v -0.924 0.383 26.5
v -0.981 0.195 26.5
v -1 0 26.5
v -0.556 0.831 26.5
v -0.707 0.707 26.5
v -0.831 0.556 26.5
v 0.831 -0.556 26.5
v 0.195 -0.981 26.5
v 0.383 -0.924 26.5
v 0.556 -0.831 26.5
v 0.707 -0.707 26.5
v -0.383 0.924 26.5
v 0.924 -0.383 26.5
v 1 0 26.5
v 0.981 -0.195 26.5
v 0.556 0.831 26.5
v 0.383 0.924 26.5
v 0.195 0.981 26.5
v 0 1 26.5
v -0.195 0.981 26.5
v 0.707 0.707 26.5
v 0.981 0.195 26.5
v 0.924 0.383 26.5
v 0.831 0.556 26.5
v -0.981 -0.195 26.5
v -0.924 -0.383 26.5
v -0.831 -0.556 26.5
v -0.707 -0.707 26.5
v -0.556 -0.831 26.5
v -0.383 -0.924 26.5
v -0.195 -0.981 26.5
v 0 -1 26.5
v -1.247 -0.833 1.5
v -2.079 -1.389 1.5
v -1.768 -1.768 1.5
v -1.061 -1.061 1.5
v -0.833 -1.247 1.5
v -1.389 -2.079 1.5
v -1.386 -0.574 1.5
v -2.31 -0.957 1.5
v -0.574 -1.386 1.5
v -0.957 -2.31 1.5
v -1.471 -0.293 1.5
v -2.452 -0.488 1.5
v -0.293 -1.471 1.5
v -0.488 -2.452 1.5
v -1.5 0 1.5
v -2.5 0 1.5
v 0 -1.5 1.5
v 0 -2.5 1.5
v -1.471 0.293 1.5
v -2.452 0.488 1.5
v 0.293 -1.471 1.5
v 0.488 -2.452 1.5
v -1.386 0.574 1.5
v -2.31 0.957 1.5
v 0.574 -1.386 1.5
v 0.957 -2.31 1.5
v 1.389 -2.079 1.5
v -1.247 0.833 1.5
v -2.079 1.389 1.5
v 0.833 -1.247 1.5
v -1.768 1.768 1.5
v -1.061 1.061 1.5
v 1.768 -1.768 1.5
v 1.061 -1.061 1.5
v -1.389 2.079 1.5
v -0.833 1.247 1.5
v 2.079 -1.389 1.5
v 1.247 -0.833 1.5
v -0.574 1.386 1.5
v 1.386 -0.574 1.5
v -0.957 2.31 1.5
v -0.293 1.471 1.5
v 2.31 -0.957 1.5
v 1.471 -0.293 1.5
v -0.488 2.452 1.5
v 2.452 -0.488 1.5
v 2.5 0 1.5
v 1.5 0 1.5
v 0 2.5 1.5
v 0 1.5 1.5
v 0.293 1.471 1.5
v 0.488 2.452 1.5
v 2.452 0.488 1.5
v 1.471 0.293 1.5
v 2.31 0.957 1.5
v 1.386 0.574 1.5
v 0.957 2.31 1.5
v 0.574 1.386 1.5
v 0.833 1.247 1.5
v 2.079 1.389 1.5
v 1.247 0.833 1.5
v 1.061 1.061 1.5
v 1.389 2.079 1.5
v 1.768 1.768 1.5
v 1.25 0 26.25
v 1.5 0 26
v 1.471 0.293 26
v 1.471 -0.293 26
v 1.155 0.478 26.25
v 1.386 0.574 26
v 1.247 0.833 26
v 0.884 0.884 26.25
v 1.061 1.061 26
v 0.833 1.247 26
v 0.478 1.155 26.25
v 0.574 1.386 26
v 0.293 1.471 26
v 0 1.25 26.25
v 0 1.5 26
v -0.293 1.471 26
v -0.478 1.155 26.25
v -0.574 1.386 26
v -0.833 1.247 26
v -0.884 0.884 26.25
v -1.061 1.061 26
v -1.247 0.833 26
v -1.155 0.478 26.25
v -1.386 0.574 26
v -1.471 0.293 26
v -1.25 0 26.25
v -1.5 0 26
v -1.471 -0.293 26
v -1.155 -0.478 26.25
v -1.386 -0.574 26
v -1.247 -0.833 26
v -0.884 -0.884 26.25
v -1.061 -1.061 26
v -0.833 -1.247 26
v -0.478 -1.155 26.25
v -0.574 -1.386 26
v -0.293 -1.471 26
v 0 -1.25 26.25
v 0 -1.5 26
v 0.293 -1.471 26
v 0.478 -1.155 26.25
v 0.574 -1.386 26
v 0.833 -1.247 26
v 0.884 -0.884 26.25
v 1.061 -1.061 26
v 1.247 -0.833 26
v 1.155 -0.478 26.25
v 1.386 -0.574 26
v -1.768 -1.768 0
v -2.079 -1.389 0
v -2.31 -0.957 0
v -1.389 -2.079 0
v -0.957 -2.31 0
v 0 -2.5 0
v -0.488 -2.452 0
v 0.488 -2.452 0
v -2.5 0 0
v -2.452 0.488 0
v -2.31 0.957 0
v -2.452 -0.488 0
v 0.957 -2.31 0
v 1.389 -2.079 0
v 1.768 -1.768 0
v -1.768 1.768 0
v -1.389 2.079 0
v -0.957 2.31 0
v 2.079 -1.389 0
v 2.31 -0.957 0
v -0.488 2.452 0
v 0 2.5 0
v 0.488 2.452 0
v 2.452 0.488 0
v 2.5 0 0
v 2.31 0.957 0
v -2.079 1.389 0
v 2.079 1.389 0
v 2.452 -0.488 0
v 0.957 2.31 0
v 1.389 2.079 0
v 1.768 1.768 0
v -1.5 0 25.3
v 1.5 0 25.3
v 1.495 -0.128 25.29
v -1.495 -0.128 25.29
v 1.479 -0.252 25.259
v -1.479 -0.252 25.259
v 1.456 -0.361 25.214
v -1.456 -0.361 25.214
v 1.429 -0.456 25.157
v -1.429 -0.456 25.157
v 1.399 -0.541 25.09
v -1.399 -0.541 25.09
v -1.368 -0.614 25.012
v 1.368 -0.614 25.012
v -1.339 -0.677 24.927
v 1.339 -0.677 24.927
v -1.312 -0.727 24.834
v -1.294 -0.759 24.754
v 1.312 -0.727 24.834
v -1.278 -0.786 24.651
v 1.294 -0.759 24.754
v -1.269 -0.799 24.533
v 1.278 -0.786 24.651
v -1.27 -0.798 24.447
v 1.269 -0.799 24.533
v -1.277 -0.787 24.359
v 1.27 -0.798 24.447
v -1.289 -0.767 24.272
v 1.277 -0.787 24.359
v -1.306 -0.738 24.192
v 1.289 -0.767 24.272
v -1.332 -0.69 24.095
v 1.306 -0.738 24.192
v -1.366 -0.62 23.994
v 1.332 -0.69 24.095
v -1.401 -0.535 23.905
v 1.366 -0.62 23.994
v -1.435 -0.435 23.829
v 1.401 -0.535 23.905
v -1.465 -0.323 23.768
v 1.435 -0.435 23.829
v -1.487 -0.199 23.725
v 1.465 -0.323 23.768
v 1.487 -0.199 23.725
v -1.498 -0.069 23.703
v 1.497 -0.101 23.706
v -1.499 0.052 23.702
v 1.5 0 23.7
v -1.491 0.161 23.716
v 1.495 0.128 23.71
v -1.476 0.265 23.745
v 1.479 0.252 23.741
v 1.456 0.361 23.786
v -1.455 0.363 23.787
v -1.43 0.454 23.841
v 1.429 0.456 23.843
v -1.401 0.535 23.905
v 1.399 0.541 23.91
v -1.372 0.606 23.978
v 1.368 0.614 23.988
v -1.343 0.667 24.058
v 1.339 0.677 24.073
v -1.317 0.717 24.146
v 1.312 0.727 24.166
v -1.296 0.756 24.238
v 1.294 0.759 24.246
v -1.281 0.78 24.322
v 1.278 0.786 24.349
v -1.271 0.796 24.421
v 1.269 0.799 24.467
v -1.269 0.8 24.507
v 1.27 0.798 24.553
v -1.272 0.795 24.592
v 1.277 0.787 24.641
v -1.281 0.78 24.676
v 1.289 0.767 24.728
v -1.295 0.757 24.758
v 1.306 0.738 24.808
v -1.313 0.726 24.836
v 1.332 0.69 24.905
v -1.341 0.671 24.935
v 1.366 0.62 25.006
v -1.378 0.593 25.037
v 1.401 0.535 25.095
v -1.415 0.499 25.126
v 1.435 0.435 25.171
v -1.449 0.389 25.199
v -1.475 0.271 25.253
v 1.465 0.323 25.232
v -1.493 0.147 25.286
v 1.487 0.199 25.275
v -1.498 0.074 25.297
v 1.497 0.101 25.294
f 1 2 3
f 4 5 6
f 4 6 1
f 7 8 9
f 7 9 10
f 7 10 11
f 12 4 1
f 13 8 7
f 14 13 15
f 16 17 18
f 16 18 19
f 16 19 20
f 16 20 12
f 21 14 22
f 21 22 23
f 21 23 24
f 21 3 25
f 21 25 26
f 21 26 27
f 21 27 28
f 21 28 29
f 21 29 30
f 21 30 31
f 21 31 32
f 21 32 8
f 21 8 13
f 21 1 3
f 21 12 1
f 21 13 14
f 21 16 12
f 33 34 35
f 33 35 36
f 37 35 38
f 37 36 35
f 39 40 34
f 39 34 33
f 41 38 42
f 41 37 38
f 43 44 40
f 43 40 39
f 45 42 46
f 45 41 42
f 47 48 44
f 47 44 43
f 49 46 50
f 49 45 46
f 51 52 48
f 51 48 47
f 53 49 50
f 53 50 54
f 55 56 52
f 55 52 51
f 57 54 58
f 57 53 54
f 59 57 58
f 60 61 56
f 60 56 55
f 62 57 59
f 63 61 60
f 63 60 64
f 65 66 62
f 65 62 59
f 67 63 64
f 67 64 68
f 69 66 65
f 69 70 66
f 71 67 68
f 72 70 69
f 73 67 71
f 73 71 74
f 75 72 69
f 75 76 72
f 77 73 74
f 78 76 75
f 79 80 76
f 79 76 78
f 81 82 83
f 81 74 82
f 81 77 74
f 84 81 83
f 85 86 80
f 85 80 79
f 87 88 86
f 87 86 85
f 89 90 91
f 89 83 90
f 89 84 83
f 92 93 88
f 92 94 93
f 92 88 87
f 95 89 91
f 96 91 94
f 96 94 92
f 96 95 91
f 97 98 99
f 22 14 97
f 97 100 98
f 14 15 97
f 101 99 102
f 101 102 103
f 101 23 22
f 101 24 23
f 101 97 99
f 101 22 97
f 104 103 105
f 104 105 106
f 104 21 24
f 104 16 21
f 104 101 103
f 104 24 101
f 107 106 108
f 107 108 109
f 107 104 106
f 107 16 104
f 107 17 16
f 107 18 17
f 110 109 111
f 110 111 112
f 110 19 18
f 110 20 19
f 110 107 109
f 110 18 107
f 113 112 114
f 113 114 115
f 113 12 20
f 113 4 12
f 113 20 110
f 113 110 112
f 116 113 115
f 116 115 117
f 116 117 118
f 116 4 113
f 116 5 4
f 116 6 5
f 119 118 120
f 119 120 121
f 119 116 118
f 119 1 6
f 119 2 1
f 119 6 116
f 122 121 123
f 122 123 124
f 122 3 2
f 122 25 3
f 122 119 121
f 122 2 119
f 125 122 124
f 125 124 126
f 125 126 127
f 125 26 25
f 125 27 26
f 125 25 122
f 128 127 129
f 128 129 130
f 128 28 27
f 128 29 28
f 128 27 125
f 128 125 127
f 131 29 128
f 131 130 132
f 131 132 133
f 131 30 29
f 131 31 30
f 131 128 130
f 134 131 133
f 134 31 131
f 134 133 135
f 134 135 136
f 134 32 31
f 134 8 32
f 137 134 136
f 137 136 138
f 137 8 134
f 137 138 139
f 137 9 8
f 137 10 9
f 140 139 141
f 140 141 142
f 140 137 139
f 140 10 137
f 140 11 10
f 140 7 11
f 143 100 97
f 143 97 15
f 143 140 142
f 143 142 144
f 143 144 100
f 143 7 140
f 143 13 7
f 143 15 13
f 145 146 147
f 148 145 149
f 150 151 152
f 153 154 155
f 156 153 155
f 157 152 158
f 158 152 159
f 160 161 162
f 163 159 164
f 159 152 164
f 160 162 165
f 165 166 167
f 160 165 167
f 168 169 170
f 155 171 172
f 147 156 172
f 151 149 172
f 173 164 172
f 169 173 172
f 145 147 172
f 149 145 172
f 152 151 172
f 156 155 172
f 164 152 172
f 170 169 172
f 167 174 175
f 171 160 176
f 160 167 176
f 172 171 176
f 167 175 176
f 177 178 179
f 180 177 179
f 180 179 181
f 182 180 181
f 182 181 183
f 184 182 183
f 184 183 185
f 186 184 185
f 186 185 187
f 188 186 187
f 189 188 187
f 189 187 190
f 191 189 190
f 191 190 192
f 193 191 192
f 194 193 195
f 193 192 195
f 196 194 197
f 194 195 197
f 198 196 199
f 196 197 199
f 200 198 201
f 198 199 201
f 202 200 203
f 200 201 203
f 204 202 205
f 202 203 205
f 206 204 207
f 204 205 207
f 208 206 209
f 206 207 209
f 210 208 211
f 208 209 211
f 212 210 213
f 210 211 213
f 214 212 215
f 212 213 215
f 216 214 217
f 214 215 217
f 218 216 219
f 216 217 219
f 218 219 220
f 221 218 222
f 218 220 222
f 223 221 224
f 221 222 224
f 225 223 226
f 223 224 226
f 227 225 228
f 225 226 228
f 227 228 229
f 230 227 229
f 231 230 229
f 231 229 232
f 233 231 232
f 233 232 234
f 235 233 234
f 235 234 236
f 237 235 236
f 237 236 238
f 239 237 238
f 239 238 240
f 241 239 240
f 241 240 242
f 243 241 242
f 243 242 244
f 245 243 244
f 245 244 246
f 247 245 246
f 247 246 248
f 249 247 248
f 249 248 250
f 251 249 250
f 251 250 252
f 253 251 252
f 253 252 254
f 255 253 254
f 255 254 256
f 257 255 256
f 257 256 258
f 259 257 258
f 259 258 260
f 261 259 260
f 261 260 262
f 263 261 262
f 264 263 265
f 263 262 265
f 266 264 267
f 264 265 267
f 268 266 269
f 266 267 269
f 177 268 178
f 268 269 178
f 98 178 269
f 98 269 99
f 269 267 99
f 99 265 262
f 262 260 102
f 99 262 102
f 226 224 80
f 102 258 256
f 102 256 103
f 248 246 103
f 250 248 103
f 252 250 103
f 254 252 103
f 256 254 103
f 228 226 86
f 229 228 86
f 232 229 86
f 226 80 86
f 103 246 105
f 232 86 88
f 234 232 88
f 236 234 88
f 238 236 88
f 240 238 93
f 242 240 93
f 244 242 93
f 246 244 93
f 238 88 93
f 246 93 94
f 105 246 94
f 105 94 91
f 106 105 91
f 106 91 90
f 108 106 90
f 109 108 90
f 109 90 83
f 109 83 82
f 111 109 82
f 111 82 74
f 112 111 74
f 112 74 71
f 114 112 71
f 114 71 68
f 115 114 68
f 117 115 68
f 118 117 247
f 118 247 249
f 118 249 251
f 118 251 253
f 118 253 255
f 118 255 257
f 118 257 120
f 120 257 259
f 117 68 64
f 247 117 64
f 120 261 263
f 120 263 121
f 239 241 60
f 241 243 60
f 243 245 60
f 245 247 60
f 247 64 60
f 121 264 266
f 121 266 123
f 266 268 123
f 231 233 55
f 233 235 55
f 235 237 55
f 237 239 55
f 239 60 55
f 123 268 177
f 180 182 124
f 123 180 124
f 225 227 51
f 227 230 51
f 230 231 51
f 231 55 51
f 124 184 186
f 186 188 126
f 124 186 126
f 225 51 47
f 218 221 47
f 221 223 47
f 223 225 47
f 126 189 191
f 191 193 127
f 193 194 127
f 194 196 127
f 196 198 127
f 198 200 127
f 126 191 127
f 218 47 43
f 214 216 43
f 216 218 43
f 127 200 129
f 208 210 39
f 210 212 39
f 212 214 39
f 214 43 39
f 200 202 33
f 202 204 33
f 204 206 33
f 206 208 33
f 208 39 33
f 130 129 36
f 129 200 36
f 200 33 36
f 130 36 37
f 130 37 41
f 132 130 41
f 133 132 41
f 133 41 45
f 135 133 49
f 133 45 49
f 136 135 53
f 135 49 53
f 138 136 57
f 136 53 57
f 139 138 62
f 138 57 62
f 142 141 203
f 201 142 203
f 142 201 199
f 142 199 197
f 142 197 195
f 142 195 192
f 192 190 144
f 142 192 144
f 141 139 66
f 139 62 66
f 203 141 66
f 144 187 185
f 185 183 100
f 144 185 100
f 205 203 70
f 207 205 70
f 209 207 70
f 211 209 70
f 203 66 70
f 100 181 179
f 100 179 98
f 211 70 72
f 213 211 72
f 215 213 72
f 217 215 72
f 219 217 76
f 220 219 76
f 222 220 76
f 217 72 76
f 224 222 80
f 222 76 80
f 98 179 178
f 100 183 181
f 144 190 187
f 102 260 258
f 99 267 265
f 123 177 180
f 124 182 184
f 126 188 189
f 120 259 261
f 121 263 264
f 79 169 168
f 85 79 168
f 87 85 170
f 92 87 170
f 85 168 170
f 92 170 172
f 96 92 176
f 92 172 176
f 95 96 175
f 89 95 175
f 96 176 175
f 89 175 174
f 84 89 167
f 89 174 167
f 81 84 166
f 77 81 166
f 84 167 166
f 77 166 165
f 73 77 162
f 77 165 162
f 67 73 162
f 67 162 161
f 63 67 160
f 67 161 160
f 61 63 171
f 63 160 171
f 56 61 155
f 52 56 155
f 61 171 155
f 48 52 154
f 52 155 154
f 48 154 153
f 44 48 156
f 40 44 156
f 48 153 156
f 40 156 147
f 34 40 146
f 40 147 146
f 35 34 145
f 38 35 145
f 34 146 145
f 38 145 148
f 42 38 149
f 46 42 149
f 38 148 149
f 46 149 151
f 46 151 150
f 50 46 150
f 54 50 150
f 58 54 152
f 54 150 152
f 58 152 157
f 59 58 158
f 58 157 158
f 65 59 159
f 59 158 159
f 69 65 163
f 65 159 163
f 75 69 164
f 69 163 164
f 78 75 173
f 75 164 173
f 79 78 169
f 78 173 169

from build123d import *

# Parameters (mm, degrees)
SKETCH_1_R          = 2.5
EXTRUDE_1_DEPTH     = 1.5
SKETCH_2_R          = 1.5
EXTRUDE_2_DEPTH     = 25
SKETCH_3_R          = 0.8
CUT_EXTRUDE_1_DEPTH = 27.916537667
CHAMFER_1_SIZE      = 0.5


with BuildPart() as part:
    # 草图1 → 凸台-拉伸1 (new body)
    with BuildSketch(Plane.XY):
        Circle(SKETCH_1_R)
    extrude(amount=EXTRUDE_1_DEPTH)

    # 草图2 → 凸台-拉伸2 (add)
    with BuildSketch(Plane.XY.offset(1.5)):
        Circle(SKETCH_2_R)
    extrude(amount=EXTRUDE_2_DEPTH)

    # 草图3 → 切除-拉伸1 (cut, through all)
    with BuildSketch(Plane(origin=(1.5, 0, 0), x_dir=(0, 0, -1), z_dir=(1, 0, 0))):
        with Locations(Location((-24.5, 0, 0), (0, 0, 180))):
            Circle(SKETCH_3_R)
    extrude(amount=-CUT_EXTRUDE_1_DEPTH, mode=Mode.SUBTRACT)

    # 倒角1
    chamfer_1_edges = [part.edges().sort_by_distance(p)[0] for p in [
        (-1.5, 0, 26.5),
    ]]
    chamfer(chamfer_1_edges, length=CHAMFER_1_SIZE)


solid = part.part
